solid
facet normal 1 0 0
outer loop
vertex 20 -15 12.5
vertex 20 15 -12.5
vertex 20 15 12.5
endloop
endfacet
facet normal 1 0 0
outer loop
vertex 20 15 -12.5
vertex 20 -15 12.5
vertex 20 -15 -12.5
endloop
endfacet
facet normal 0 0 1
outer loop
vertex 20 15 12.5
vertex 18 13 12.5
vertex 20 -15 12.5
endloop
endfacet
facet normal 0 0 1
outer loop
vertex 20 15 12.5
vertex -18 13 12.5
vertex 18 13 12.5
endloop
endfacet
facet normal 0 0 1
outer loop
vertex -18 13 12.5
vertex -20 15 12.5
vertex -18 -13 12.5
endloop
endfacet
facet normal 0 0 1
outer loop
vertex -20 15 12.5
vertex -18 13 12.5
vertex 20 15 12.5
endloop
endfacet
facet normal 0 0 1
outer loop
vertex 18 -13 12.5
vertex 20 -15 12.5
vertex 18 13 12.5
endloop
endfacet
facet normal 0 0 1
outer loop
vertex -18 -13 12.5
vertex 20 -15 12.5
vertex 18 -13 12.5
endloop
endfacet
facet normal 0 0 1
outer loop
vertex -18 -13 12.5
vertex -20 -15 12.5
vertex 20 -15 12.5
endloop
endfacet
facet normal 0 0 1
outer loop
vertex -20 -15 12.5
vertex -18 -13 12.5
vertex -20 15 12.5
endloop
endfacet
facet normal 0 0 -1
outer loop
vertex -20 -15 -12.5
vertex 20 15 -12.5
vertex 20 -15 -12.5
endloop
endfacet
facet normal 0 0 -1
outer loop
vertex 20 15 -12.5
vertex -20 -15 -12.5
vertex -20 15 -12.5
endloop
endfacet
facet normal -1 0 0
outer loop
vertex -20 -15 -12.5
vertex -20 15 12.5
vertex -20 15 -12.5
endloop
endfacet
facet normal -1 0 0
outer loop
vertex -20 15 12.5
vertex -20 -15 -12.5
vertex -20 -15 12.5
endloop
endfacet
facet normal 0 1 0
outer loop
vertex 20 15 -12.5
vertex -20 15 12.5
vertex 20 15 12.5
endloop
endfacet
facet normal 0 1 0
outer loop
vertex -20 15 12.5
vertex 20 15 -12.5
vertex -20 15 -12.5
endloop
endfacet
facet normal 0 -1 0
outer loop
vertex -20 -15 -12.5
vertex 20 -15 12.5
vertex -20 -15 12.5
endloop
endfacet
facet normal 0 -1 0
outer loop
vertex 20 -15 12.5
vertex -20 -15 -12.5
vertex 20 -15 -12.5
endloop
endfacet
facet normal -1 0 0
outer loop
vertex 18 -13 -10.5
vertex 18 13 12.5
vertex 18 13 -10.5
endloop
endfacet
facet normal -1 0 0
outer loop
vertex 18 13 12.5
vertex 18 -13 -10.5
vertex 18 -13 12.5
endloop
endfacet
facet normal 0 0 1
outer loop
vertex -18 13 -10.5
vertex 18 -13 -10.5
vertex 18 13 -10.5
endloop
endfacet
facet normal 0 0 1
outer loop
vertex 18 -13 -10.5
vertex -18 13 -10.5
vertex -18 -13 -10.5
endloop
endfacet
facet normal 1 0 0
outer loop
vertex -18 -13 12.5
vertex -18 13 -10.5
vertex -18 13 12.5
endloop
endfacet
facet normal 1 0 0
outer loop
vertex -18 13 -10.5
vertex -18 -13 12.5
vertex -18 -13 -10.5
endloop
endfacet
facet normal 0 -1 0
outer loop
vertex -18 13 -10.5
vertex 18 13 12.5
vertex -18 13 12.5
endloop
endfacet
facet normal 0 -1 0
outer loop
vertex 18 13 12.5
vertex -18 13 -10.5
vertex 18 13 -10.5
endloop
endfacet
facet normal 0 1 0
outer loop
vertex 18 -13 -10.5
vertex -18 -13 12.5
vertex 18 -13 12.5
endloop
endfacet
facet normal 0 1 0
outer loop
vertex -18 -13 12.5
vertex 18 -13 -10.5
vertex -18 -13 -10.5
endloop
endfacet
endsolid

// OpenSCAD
// Parametric Box

/* [Size] */
width = 40;       // [10:100]
depth = 30;       // [10:100]
height = 25;      // [5:0.5:60]

/* [Walls] */
wall = 2;         // [1:0.5:5]
has_lid = true;
rounding = 3;     // [0:10]

/* [Style] */
corner_style = "round"; // [round, sharp, chamfer]
sides = 6;              // [3, 4, 5, 6, 8]

module box() {
    difference() {
        cube([width, depth, height], center = true);
        translate([0, 0, wall])
            cube([width - 2 * wall, depth - 2 * wall, height], center = true);
    }
}

box();
